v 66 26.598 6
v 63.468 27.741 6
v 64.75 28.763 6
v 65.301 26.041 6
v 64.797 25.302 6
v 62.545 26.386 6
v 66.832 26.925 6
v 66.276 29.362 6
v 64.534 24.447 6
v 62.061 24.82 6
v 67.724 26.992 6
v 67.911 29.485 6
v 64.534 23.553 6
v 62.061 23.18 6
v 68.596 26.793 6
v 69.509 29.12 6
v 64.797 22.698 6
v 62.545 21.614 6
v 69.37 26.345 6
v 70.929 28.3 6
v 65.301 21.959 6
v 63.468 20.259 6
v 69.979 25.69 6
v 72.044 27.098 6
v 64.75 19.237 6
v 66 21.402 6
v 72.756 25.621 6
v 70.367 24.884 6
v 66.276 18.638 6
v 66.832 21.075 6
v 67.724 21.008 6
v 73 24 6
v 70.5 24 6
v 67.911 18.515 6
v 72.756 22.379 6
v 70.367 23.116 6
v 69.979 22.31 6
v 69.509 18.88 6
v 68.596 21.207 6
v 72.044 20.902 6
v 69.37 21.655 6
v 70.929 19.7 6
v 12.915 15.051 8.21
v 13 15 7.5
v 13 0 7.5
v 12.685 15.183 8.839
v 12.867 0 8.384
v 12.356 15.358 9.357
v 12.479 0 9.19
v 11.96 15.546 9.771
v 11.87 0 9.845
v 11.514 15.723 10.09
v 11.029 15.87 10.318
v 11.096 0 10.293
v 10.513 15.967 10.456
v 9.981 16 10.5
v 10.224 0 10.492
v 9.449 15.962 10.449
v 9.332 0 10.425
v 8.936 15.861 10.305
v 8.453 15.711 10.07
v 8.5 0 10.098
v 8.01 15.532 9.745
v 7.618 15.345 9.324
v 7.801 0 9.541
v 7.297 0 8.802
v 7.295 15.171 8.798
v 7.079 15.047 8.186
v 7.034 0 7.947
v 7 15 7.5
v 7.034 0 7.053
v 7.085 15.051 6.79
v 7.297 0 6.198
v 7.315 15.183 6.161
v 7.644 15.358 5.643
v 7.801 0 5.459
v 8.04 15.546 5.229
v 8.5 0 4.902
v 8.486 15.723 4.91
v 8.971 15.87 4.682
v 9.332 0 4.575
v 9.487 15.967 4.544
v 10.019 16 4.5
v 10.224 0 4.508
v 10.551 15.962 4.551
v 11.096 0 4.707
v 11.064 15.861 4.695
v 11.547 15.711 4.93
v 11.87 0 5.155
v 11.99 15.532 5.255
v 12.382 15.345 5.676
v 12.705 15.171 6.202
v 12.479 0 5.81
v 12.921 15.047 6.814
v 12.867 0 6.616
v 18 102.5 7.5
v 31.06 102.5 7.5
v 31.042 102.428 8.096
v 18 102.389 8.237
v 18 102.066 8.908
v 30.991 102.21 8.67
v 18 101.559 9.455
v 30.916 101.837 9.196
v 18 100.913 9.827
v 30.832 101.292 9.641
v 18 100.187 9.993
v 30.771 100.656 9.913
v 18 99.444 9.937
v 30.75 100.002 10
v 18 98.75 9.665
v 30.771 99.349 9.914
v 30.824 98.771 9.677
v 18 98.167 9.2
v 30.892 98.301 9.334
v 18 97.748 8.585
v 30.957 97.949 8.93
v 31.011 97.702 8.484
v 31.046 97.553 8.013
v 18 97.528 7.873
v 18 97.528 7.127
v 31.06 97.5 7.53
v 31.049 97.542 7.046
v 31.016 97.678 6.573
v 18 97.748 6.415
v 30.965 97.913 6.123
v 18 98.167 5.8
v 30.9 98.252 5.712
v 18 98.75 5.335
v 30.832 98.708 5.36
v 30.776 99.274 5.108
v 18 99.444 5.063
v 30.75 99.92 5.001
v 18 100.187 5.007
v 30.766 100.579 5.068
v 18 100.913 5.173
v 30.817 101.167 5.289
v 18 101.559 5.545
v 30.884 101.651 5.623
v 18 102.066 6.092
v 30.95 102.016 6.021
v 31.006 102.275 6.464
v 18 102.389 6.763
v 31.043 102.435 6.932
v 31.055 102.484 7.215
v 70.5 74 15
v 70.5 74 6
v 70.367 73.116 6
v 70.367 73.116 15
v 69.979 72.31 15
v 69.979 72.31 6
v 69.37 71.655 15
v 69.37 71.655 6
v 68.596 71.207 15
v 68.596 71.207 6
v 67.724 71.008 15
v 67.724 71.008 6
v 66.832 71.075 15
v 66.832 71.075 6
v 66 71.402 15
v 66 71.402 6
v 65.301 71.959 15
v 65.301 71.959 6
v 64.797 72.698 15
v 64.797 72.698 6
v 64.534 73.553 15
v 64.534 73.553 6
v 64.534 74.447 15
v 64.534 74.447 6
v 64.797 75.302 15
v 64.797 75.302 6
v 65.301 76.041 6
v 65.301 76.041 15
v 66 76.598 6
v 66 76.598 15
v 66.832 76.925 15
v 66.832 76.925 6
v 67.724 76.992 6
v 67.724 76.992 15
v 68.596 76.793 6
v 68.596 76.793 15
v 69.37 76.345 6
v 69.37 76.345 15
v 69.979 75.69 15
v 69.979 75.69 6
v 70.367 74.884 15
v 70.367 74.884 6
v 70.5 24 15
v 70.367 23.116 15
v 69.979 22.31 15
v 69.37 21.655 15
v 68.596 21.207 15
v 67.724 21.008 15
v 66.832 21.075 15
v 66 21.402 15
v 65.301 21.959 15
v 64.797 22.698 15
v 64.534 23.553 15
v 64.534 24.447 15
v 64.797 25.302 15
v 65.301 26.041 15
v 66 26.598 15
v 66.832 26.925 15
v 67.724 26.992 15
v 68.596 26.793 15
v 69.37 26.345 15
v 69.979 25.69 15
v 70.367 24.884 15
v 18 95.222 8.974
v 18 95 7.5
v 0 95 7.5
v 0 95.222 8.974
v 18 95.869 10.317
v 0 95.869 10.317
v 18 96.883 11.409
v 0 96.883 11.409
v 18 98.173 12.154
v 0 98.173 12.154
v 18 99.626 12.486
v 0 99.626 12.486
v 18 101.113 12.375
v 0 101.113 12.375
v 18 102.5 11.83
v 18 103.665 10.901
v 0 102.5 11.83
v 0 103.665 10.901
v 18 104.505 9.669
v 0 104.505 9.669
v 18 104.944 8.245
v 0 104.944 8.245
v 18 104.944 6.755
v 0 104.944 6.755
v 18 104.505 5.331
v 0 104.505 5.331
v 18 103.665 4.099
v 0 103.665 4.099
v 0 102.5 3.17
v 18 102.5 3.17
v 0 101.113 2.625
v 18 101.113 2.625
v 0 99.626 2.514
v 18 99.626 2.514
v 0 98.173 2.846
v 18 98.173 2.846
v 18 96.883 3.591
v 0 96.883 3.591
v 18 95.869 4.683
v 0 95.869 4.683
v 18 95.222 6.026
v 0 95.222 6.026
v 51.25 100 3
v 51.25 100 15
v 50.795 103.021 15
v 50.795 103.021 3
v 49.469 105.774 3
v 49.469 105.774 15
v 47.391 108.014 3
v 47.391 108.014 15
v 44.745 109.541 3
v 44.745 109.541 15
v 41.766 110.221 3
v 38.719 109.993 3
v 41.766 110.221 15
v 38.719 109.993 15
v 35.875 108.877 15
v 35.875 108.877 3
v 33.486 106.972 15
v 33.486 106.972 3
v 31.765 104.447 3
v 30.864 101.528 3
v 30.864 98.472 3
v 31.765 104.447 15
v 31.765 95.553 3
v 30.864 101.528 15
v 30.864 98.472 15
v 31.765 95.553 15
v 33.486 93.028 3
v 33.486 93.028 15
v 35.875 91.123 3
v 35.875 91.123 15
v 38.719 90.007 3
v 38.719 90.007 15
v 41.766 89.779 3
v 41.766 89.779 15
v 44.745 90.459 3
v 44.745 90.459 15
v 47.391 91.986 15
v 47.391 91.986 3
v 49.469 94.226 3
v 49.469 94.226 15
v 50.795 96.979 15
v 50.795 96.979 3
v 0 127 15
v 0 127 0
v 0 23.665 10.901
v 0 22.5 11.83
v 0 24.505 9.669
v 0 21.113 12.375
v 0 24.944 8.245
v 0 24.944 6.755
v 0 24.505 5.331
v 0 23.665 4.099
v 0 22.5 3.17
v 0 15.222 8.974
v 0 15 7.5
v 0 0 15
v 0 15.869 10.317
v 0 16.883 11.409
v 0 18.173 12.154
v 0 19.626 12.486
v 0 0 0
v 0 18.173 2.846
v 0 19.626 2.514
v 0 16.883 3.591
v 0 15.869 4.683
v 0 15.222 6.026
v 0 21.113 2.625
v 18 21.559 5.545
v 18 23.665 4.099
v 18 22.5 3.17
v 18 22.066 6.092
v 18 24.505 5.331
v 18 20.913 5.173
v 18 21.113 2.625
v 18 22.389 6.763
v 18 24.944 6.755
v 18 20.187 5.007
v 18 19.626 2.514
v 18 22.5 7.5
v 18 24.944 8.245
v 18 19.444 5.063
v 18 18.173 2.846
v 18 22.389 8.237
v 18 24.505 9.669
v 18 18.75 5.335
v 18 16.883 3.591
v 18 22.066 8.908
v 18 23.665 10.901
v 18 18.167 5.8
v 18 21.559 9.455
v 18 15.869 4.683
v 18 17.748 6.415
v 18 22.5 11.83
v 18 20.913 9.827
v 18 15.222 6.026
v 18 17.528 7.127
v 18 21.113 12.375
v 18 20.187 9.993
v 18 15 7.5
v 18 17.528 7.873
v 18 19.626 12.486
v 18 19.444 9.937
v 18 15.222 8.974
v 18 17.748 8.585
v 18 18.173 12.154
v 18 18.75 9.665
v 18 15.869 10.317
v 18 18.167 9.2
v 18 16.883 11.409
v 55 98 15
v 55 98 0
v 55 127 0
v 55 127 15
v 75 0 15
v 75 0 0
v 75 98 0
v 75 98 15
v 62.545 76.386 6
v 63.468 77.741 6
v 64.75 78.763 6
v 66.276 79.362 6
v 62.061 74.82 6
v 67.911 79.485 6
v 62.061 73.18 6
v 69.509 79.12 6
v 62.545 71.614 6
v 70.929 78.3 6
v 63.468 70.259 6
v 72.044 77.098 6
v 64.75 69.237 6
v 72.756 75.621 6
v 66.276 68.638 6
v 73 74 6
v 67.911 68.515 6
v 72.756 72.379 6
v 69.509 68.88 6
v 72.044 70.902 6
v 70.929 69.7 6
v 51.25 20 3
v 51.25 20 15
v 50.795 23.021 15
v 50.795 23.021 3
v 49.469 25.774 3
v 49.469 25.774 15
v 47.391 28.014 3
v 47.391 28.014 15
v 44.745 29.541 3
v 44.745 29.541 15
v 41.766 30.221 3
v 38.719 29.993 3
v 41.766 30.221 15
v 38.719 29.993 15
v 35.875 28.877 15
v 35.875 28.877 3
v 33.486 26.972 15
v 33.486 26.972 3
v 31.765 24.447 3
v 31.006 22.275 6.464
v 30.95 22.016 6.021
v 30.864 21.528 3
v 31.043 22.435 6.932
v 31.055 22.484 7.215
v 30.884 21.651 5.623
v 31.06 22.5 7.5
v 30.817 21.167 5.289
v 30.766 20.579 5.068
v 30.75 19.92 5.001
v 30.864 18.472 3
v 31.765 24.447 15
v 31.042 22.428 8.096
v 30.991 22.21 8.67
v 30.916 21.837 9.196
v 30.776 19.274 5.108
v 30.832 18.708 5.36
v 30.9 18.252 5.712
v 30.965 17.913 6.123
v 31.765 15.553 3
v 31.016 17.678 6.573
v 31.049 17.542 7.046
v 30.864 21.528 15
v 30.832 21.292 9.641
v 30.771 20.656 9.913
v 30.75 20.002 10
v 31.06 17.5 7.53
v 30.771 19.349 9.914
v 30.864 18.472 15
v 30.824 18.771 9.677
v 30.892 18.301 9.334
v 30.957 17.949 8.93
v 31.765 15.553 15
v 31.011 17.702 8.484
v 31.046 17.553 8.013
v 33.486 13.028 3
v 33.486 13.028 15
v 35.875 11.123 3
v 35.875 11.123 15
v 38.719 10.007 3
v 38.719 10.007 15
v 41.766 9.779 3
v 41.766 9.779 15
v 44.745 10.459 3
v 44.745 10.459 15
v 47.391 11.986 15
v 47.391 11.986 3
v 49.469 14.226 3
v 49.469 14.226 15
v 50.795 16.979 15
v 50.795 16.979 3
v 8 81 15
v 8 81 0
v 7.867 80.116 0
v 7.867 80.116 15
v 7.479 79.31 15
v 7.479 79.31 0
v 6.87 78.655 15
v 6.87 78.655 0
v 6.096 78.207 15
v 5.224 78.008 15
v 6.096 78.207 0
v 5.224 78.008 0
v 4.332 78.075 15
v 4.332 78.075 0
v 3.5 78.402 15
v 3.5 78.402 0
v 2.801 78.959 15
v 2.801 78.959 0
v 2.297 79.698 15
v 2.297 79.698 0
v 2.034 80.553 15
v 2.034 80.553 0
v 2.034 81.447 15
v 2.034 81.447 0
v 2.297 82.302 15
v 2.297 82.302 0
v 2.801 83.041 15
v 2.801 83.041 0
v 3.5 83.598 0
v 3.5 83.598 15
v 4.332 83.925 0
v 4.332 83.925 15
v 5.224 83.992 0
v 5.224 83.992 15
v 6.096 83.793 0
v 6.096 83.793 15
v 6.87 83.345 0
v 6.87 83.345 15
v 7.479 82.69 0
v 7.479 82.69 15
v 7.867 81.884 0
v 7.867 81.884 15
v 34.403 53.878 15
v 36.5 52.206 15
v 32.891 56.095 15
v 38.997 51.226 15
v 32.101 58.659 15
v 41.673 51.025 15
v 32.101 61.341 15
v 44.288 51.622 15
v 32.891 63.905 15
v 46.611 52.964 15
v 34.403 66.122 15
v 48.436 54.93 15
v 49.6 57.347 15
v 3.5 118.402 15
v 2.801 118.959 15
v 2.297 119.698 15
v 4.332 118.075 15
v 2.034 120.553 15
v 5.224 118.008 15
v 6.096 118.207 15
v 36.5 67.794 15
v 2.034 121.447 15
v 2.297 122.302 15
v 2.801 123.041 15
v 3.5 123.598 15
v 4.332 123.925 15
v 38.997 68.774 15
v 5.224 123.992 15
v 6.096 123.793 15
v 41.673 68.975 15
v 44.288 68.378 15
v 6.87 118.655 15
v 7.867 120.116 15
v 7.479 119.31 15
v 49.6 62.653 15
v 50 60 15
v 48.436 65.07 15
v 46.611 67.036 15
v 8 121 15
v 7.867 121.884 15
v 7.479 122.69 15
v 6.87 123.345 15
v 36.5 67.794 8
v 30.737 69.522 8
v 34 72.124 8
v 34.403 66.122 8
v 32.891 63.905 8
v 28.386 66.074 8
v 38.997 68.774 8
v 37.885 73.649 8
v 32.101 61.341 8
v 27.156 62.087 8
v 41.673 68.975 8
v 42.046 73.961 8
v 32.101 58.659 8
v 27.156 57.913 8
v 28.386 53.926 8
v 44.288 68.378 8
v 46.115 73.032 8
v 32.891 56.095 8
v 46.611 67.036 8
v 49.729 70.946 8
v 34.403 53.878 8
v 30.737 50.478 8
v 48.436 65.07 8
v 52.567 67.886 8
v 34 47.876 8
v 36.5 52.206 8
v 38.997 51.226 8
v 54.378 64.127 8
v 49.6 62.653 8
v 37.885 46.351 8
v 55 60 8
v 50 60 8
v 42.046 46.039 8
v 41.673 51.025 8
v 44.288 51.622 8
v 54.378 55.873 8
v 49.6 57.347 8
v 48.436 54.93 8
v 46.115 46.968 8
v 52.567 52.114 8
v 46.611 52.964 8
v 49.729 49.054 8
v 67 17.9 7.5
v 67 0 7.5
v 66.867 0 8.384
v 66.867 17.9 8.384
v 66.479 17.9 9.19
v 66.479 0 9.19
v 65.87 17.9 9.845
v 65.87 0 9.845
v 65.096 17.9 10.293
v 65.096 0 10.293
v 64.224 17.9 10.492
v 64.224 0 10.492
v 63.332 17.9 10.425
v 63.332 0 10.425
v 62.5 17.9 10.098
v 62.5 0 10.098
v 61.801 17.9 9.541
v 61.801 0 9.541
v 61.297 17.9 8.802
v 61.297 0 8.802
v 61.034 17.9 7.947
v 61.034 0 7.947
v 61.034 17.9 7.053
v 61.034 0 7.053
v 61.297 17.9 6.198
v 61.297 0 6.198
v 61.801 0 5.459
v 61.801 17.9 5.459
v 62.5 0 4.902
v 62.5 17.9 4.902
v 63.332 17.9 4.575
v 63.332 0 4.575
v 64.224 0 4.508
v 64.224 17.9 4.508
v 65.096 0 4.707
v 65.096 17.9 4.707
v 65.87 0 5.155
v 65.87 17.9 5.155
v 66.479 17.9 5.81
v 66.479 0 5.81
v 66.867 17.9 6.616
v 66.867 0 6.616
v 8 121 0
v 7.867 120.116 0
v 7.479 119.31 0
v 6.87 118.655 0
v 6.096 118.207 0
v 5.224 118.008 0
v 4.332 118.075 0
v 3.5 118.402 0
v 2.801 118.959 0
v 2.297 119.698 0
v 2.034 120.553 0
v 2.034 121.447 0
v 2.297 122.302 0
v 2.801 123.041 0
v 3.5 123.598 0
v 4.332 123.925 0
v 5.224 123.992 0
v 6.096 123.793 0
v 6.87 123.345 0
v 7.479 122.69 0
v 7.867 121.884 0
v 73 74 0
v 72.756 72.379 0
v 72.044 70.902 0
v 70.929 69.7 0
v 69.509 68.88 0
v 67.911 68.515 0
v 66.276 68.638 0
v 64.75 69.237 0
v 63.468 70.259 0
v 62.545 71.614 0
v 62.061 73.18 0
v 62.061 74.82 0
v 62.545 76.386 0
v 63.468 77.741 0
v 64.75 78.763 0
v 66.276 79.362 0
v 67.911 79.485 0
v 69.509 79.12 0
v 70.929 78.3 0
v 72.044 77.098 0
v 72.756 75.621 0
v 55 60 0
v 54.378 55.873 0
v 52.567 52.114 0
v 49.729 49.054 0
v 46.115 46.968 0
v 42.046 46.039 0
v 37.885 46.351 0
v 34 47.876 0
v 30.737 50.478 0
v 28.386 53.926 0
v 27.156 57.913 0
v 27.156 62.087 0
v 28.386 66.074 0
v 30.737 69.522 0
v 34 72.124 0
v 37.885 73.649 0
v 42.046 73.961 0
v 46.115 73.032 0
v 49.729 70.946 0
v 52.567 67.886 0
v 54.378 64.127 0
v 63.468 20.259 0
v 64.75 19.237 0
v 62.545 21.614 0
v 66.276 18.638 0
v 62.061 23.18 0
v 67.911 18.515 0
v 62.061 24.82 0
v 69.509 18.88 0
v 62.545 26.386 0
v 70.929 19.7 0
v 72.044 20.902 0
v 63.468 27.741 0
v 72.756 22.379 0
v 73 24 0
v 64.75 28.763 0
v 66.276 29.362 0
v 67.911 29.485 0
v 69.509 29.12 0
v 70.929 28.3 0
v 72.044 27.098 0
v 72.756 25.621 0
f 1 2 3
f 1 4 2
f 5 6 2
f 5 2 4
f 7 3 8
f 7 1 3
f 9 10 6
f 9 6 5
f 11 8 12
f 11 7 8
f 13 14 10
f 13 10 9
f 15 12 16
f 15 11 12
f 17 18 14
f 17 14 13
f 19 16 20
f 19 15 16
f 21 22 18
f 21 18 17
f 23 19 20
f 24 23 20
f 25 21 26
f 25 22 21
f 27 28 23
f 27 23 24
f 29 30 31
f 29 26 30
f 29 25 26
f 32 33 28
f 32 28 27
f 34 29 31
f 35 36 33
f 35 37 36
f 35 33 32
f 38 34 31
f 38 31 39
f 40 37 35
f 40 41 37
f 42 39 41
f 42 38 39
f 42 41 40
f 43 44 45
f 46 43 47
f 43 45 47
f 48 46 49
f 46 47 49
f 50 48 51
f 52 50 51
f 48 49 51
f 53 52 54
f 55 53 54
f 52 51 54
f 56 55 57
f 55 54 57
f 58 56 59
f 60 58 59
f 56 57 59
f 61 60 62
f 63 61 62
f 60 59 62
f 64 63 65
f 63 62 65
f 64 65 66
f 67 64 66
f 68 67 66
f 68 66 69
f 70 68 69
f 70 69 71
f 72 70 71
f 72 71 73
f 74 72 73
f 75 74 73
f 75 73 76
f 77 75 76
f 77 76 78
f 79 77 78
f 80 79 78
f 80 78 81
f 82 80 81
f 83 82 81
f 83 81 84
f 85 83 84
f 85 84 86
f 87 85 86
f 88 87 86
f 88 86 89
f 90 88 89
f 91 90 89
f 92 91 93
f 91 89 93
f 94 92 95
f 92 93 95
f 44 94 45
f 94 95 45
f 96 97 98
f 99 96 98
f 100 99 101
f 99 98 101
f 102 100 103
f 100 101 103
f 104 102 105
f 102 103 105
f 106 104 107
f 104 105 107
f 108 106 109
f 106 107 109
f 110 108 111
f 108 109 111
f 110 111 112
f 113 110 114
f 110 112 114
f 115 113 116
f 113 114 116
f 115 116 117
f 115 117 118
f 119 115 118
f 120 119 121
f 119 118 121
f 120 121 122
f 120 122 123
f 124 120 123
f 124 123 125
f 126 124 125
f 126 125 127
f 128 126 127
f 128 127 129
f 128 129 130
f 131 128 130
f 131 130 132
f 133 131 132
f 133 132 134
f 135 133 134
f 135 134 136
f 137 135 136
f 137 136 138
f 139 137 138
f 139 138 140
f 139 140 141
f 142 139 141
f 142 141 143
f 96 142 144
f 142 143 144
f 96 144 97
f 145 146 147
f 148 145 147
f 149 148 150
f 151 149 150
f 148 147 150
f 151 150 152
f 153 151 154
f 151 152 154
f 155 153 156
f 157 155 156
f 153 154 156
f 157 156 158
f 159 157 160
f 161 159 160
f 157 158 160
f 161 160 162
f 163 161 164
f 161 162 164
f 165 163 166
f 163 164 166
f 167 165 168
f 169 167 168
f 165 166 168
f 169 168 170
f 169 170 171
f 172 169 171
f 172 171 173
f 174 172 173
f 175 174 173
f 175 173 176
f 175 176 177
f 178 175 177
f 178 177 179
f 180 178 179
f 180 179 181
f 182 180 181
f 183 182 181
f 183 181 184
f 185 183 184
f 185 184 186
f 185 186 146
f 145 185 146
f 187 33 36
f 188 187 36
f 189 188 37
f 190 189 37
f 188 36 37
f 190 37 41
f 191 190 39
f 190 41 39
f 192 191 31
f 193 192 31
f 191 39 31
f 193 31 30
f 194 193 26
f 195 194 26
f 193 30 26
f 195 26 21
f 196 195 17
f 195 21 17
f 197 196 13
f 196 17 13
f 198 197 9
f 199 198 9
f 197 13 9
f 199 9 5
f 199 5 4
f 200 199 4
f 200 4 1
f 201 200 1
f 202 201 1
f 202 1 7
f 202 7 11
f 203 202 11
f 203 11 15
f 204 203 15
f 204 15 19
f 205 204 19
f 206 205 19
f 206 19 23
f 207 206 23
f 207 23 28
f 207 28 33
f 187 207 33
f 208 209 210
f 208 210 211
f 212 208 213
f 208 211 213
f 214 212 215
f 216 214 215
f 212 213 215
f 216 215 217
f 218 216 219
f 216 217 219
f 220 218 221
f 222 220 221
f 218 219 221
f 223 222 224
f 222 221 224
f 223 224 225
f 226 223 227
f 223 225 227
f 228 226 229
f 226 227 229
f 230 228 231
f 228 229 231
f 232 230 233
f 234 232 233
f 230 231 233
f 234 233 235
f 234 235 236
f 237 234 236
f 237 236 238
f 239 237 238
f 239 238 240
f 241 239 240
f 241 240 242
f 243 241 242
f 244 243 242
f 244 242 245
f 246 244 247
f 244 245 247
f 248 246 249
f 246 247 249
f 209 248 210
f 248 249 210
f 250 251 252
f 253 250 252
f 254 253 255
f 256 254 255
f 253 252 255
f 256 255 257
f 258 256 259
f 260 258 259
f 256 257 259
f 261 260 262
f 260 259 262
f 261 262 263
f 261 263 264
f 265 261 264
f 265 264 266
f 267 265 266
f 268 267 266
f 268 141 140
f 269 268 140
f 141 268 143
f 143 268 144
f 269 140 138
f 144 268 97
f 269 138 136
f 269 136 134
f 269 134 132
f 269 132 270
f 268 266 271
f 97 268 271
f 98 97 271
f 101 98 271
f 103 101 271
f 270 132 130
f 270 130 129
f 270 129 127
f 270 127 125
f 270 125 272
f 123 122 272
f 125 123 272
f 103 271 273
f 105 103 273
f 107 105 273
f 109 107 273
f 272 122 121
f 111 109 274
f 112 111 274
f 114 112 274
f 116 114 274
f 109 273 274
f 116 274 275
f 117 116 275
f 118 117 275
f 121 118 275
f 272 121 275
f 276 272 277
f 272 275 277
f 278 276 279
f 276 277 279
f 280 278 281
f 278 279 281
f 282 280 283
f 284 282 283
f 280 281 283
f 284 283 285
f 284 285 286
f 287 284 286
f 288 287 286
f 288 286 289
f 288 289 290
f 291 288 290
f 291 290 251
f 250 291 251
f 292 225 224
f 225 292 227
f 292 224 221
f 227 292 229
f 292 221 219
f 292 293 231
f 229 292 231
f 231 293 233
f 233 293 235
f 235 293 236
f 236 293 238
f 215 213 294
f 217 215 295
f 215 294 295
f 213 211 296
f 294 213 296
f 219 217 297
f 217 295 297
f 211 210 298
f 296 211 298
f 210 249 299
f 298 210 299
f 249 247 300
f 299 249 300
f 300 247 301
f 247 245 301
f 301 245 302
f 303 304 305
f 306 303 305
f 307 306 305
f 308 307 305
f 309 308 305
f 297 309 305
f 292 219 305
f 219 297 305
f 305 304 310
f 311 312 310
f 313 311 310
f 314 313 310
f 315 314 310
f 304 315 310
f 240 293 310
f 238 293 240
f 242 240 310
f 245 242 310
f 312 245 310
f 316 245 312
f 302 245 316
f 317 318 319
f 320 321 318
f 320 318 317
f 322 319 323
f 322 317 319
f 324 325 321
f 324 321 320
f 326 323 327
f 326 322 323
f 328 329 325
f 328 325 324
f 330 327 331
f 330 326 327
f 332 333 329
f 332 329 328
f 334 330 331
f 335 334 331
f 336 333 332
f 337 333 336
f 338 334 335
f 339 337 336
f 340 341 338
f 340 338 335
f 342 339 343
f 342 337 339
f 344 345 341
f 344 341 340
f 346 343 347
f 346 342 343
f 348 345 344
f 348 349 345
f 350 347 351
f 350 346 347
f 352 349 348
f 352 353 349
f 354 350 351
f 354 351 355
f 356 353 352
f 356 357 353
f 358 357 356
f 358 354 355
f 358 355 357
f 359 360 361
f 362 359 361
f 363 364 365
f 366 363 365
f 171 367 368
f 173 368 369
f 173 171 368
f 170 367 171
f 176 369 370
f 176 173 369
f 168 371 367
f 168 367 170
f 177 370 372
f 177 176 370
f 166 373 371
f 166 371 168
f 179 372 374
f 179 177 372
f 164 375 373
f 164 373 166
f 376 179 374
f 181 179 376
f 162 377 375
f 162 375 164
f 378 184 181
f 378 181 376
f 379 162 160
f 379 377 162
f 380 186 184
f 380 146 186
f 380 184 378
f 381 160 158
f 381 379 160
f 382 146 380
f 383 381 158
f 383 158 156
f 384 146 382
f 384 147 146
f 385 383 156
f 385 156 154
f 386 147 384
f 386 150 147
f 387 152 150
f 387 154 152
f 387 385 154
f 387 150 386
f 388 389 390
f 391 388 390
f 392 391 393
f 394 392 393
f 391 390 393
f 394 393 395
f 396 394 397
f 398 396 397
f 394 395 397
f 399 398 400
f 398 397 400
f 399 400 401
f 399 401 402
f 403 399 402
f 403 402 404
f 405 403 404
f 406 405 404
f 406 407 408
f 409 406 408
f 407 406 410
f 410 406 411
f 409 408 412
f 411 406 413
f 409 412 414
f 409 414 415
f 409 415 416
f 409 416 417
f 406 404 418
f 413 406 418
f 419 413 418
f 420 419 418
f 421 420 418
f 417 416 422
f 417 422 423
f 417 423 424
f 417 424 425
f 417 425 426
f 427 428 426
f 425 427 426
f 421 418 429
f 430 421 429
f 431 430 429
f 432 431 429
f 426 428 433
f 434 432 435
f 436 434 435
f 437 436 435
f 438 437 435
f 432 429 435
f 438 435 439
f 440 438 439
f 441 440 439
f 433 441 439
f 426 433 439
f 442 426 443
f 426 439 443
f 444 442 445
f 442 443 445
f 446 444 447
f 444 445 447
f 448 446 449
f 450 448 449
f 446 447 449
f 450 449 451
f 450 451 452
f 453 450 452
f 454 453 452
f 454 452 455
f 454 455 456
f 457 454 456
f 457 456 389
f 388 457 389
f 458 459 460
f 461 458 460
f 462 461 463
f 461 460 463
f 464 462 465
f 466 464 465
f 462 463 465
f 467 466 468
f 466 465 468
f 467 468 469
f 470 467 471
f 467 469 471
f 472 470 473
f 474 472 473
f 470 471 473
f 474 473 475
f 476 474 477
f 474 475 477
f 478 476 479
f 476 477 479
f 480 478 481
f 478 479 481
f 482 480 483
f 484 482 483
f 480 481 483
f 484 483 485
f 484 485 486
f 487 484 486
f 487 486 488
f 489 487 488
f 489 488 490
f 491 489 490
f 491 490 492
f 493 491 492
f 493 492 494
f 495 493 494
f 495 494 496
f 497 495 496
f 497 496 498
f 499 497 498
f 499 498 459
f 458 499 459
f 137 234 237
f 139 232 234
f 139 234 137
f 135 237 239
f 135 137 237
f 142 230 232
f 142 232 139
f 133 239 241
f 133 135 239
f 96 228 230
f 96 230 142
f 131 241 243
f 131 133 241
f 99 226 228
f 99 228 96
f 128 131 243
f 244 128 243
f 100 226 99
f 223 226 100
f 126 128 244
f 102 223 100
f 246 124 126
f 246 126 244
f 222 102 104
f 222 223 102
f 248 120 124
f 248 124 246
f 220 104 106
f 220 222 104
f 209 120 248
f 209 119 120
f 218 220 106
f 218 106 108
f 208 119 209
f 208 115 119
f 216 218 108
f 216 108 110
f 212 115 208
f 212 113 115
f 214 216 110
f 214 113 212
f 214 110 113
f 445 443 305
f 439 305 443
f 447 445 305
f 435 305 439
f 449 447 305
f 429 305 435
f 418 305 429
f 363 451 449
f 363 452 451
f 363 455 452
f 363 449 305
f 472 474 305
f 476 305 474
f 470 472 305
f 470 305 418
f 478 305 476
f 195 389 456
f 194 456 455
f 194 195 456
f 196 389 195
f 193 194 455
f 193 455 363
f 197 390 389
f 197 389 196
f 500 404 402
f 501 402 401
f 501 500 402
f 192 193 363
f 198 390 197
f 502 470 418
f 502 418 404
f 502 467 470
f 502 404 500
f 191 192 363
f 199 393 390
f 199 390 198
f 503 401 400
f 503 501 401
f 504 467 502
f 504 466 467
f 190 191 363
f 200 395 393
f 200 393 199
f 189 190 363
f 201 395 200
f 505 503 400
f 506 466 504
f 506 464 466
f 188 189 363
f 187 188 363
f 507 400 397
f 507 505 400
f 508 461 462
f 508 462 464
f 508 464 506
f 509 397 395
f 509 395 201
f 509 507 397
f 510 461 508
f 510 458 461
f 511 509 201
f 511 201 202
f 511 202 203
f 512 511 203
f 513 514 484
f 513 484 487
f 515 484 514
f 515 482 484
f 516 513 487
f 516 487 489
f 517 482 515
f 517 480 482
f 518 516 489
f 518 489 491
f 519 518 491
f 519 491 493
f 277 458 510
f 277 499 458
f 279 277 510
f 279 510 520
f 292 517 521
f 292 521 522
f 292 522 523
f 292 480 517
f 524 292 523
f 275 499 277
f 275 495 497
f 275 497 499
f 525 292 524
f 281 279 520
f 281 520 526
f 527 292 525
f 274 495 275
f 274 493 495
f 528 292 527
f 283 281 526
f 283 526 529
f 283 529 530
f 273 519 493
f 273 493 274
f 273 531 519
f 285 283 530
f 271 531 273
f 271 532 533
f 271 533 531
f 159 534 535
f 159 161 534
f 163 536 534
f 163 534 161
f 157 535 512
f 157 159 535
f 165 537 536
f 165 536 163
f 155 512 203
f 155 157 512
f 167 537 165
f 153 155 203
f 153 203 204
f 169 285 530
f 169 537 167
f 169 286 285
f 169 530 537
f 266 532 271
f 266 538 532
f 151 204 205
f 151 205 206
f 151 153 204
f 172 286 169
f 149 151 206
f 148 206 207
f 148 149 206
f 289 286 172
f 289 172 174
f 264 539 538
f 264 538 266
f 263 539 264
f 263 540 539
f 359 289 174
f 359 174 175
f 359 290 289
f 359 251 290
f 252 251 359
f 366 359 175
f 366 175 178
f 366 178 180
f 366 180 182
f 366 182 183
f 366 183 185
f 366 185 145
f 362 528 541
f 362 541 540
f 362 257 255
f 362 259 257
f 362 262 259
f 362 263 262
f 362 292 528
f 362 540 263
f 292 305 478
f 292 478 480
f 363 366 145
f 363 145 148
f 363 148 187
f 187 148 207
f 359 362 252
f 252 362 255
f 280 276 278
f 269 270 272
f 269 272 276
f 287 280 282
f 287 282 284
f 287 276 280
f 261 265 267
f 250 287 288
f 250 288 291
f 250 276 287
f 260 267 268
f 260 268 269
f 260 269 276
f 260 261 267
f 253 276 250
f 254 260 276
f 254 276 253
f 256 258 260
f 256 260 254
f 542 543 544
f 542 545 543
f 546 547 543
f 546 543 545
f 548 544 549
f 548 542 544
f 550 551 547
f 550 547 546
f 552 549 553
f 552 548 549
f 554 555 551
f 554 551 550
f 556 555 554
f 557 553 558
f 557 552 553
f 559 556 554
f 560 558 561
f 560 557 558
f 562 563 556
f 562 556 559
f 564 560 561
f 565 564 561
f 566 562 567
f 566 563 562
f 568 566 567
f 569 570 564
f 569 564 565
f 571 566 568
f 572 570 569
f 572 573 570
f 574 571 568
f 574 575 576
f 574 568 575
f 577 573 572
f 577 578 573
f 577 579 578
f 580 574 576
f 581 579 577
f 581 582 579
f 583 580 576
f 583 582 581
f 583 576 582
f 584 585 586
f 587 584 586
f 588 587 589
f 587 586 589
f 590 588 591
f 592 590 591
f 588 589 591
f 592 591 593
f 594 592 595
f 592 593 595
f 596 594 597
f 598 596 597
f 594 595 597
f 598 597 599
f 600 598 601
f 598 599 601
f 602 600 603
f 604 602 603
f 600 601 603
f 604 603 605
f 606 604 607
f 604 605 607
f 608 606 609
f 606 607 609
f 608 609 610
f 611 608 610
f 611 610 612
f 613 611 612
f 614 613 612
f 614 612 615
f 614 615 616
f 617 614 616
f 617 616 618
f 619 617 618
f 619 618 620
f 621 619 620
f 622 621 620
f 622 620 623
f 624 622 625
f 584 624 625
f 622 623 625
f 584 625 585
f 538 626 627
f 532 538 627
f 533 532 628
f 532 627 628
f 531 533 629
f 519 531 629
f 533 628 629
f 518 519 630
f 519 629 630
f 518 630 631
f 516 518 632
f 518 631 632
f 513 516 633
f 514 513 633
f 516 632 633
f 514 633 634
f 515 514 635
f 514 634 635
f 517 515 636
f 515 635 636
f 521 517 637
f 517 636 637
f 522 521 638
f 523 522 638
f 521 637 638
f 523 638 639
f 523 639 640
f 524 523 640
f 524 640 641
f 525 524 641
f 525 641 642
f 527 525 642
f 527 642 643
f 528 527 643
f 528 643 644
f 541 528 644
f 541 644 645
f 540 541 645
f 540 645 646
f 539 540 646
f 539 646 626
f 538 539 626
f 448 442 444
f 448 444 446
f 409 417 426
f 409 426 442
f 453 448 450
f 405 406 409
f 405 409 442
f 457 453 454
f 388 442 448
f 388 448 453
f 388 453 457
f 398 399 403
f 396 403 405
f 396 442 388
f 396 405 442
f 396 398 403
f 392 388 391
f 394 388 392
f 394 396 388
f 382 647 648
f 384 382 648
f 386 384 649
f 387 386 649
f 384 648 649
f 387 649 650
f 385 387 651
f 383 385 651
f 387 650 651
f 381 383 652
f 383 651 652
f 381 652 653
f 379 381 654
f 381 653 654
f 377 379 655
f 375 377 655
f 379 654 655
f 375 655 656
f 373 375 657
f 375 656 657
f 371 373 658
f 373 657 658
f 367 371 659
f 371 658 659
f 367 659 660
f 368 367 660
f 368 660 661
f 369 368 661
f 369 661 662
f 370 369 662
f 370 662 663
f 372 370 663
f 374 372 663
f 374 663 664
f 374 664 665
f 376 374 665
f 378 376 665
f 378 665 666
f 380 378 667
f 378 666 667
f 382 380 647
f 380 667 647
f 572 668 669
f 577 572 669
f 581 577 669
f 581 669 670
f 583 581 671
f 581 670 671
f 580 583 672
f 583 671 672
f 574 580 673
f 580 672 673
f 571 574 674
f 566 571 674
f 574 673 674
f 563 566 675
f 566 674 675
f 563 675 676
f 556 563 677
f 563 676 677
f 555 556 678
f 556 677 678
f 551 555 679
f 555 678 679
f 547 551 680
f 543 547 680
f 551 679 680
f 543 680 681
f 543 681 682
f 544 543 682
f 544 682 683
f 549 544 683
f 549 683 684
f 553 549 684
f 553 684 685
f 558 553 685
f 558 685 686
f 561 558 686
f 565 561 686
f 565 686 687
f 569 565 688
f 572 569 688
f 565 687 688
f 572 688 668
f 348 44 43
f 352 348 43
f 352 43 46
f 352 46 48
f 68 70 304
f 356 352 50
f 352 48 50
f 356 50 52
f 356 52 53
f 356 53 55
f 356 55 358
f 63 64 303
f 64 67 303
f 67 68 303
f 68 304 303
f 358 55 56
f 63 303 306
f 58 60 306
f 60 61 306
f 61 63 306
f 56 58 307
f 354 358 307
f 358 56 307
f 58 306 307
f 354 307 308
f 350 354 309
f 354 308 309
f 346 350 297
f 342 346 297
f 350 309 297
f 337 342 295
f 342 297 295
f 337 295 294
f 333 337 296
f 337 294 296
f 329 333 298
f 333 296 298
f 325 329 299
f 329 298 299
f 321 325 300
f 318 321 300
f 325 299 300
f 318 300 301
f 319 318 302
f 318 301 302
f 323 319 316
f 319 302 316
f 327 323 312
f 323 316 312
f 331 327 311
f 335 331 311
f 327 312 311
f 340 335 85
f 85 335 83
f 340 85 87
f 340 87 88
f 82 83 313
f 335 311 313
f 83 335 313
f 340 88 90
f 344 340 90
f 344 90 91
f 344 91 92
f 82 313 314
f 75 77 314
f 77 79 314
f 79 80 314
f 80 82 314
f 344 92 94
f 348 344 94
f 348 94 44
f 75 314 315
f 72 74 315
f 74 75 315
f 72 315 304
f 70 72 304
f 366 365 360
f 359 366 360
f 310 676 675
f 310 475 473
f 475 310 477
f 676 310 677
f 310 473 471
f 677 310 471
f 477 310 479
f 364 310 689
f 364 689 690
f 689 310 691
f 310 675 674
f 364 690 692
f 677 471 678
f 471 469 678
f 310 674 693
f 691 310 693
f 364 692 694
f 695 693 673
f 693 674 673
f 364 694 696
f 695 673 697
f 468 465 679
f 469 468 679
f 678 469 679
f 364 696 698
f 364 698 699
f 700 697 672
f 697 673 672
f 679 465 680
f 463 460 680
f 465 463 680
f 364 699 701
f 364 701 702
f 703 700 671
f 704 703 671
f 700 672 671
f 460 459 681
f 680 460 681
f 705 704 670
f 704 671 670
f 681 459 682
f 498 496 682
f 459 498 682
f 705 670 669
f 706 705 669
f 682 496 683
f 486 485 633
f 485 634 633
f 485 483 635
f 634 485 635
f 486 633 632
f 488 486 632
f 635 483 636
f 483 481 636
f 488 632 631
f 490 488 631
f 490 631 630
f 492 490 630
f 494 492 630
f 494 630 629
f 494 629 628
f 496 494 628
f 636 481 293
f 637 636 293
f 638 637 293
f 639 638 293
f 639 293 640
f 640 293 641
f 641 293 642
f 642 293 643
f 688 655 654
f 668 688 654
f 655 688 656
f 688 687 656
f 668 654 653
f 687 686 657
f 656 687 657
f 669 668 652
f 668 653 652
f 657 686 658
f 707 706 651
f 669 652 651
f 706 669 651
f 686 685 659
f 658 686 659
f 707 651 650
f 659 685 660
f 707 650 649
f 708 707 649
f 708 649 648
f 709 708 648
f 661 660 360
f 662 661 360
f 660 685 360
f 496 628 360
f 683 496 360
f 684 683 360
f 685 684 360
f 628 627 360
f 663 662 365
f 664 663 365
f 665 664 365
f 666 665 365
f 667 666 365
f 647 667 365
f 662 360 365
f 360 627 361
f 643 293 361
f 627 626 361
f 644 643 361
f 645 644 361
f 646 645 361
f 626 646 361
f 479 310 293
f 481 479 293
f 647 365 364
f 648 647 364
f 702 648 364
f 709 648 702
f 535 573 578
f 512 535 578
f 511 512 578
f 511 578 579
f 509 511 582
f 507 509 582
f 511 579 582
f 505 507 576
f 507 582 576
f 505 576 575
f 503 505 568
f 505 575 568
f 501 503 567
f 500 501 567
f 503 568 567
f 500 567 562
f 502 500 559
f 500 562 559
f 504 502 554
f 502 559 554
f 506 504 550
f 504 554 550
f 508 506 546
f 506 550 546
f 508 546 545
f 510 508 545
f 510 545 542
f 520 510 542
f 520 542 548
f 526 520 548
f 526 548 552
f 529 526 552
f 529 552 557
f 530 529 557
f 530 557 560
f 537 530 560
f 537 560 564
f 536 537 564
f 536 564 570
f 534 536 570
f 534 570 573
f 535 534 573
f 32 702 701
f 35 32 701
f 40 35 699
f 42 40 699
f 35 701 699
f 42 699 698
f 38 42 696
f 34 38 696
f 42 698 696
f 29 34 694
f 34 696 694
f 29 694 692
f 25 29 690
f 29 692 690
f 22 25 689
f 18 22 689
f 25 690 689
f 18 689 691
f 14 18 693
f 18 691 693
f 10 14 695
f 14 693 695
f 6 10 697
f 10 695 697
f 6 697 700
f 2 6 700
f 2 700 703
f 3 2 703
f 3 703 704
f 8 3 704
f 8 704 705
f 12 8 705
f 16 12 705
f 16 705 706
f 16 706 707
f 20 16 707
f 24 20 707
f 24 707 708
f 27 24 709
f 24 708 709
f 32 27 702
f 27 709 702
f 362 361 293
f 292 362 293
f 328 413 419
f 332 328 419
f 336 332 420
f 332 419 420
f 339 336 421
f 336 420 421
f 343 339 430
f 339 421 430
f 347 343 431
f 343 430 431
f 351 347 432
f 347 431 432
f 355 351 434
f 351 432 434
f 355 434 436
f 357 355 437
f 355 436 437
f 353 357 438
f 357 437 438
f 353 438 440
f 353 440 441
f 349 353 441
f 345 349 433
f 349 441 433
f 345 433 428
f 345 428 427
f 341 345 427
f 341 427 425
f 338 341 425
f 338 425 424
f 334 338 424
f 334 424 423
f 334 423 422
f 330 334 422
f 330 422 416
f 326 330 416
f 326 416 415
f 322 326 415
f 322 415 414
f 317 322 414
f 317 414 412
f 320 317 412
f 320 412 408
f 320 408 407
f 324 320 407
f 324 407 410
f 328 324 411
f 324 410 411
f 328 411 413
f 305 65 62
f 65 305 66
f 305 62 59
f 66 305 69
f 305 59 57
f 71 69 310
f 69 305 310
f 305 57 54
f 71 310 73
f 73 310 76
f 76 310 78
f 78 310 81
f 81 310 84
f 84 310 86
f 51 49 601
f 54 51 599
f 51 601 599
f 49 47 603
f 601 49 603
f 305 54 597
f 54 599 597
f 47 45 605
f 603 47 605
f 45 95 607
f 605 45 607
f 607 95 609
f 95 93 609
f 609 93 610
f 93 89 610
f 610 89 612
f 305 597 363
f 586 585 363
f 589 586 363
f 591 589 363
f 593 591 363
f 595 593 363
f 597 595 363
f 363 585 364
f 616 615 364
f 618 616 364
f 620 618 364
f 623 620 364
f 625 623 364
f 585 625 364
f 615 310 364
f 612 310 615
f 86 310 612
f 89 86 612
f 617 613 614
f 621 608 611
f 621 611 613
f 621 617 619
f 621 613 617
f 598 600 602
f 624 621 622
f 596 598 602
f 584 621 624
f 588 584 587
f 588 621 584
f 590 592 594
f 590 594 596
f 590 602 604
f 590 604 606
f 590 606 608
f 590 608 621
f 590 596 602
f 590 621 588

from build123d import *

# Parameters (mm, degrees)
F1_DEPTH  = 15
F2_R      = 3
F2_R_2    = 9
F3_DEPTH  = 15.001
F4_R      = 5.5
F5_DEPTH  = 6
F6_R      = 10.25
F7_DEPTH  = 12
F9_D      = 5
F9_DEPTH  = 35
F10_R     = 5
F10_R_2   = 2.5
F11_DEPTH = 18
F12_R     = 3
F13_DEPTH = 17.9
F14_R     = 14
F15_DEPTH = 8


with BuildPart() as f1:
    # F0 (on Top) → F1 (new body)
    with BuildSketch(Plane.XY):
        Polygon((0, 127), (0, 0), (75, 0), (75, 98), (55, 98), (55, 127), align=None)
    extrude(amount=F1_DEPTH)

    # F2 (on face) → F3 (cut, through all)
    with BuildSketch(Plane(origin=(0, 0, 0), x_dir=(1, 0, 0), z_dir=(0, 0, -1))):
        with Locations((5, -121)):
            Circle(F2_R)
        with Locations((5, -81)):
            Circle(F2_R)
        with Locations((41, -60)):
            Circle(F2_R_2)
        with Locations((67.5, -24)):
            Circle(F2_R)
        with Locations((67.5, -74)):
            Circle(F2_R)
    extrude(amount=-F3_DEPTH, mode=Mode.SUBTRACT)

    # F4 (on face) → F5 (cut)
    with BuildSketch(Plane(origin=(0, 0, 0), x_dir=(1, 0, 0), z_dir=(0, 0, -1))):
        with Locations((67.5, -74)):
            Circle(F4_R)
        with Locations((67.5, -24)):
            Circle(F4_R)
    extrude(amount=-F5_DEPTH, mode=Mode.SUBTRACT)

    # F6 (on face) → F7 (cut)
    with BuildSketch(Plane.XY.offset(15)):
        with Locations((41, 100)):
            Circle(F6_R)
        with Locations((41, 20)):
            Circle(F6_R)
    extrude(amount=-F7_DEPTH, mode=Mode.SUBTRACT)

    # F9
    with Locations(Plane(origin=(0, 0, 0), x_dir=(0, -1, 0), z_dir=(-1, 0, 0))):
        with Locations((-100, 7.5), (-20, 7.5)):
            Hole(F9_D / 2, depth=F9_DEPTH)

    # F10 (on face) → F11 (cut)
    with BuildSketch(Plane(origin=(0, 0, 0), x_dir=(0, -1, 0), z_dir=(-1, 0, 0))):
        with Locations((-100, 7.5)):
            Circle(F10_R)
        with Locations((-100, 7.5)):
            Circle(F10_R_2, mode=Mode.SUBTRACT)
        with Locations((-20, 7.5)):
            Circle(F10_R)
        with Locations((-20, 7.5)):
            Circle(F10_R_2, mode=Mode.SUBTRACT)
    extrude(amount=-F11_DEPTH, mode=Mode.SUBTRACT)

    # F12 (on face) → F13 (cut)
    with BuildSketch(Plane.XZ):
        with Locations((10, 7.5)):
            Circle(F12_R)
        with Locations((64, 7.5)):
            Circle(F12_R)
    extrude(amount=-F13_DEPTH, mode=Mode.SUBTRACT)

    # F14 (on face) → F15 (cut)
    with BuildSketch(Plane(origin=(0, 0, 0), x_dir=(1, 0, 0), z_dir=(0, 0, -1))):
        with Locations((41, -60)):
            Circle(F14_R)
    extrude(amount=-F15_DEPTH, mode=Mode.SUBTRACT)


solid = f1.part
